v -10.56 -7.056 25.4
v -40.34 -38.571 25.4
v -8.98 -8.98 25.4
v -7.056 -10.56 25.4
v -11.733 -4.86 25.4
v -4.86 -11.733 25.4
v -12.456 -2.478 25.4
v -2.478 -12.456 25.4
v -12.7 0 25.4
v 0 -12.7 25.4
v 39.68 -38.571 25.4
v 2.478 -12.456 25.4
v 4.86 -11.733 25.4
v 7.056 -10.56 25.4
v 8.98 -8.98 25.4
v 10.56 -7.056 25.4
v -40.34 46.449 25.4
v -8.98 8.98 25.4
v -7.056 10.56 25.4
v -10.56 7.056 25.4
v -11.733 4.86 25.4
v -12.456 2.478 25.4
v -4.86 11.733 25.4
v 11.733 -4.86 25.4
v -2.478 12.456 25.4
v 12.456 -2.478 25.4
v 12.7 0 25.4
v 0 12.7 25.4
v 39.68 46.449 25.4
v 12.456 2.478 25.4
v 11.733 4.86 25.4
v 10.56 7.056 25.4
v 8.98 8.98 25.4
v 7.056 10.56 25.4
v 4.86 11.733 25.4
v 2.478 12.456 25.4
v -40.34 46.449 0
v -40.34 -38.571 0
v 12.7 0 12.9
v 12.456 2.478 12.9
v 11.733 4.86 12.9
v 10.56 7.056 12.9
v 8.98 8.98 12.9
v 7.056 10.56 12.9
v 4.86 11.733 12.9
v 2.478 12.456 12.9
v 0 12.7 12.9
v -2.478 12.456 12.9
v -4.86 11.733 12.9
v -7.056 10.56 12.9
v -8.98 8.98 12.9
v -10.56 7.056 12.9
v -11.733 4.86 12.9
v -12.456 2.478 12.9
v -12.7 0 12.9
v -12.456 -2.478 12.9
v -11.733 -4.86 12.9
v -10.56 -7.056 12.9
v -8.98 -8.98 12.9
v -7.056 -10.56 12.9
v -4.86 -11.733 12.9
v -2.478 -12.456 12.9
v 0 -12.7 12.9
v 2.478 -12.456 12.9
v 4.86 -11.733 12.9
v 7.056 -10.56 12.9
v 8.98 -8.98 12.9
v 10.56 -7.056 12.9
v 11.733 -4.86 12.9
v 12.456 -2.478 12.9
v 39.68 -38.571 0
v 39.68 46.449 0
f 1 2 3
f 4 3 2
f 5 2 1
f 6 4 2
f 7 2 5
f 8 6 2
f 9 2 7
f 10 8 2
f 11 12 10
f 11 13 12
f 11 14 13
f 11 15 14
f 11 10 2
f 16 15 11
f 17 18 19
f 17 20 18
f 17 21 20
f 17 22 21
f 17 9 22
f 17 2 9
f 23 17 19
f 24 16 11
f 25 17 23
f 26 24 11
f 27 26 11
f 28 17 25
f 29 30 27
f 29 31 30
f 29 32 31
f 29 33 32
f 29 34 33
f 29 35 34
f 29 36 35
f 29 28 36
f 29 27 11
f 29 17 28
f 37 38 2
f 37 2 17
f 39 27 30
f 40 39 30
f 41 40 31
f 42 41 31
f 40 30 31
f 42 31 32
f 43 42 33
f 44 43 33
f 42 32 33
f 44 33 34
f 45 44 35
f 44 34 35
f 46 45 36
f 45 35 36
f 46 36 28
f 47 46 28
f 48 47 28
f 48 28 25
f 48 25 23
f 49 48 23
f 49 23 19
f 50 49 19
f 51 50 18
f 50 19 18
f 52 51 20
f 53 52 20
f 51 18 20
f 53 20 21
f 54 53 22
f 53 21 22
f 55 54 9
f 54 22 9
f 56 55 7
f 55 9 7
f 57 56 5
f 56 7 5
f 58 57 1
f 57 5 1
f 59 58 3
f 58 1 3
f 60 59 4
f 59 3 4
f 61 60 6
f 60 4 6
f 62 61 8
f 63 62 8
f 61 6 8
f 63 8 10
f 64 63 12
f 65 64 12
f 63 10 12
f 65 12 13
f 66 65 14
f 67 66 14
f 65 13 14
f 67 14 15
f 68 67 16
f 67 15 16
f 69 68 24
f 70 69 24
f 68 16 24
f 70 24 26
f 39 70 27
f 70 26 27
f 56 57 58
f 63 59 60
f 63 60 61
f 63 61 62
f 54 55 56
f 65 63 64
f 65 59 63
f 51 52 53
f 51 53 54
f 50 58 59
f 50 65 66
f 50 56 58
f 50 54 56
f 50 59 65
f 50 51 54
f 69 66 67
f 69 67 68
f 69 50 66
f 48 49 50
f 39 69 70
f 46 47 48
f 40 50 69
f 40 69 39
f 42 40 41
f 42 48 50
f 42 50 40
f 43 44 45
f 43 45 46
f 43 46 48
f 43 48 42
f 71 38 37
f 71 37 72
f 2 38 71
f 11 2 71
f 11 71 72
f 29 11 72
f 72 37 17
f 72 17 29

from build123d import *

# Parameters (mm, degrees)
F0_W     = 80.02039
F0_H     = 85.019648
F1_DEPTH = 25.4
F3_R     = 12.7
F2_DEPTH = 12.5


with BuildPart() as f1:
    # F0 (on Top) → F1 (new body)
    with BuildSketch(Plane.XY):
        with Locations((-0.330042, 3.939137)):
            Rectangle(F0_W, F0_H)
    extrude(amount=F1_DEPTH)

    # F3 (on face) → F2 (cut, symmetric)
    with BuildSketch(Plane.XY.offset(25.4)):
        Circle(F3_R)
    extrude(amount=F2_DEPTH, both=True, mode=Mode.SUBTRACT)


solid = f1.part
